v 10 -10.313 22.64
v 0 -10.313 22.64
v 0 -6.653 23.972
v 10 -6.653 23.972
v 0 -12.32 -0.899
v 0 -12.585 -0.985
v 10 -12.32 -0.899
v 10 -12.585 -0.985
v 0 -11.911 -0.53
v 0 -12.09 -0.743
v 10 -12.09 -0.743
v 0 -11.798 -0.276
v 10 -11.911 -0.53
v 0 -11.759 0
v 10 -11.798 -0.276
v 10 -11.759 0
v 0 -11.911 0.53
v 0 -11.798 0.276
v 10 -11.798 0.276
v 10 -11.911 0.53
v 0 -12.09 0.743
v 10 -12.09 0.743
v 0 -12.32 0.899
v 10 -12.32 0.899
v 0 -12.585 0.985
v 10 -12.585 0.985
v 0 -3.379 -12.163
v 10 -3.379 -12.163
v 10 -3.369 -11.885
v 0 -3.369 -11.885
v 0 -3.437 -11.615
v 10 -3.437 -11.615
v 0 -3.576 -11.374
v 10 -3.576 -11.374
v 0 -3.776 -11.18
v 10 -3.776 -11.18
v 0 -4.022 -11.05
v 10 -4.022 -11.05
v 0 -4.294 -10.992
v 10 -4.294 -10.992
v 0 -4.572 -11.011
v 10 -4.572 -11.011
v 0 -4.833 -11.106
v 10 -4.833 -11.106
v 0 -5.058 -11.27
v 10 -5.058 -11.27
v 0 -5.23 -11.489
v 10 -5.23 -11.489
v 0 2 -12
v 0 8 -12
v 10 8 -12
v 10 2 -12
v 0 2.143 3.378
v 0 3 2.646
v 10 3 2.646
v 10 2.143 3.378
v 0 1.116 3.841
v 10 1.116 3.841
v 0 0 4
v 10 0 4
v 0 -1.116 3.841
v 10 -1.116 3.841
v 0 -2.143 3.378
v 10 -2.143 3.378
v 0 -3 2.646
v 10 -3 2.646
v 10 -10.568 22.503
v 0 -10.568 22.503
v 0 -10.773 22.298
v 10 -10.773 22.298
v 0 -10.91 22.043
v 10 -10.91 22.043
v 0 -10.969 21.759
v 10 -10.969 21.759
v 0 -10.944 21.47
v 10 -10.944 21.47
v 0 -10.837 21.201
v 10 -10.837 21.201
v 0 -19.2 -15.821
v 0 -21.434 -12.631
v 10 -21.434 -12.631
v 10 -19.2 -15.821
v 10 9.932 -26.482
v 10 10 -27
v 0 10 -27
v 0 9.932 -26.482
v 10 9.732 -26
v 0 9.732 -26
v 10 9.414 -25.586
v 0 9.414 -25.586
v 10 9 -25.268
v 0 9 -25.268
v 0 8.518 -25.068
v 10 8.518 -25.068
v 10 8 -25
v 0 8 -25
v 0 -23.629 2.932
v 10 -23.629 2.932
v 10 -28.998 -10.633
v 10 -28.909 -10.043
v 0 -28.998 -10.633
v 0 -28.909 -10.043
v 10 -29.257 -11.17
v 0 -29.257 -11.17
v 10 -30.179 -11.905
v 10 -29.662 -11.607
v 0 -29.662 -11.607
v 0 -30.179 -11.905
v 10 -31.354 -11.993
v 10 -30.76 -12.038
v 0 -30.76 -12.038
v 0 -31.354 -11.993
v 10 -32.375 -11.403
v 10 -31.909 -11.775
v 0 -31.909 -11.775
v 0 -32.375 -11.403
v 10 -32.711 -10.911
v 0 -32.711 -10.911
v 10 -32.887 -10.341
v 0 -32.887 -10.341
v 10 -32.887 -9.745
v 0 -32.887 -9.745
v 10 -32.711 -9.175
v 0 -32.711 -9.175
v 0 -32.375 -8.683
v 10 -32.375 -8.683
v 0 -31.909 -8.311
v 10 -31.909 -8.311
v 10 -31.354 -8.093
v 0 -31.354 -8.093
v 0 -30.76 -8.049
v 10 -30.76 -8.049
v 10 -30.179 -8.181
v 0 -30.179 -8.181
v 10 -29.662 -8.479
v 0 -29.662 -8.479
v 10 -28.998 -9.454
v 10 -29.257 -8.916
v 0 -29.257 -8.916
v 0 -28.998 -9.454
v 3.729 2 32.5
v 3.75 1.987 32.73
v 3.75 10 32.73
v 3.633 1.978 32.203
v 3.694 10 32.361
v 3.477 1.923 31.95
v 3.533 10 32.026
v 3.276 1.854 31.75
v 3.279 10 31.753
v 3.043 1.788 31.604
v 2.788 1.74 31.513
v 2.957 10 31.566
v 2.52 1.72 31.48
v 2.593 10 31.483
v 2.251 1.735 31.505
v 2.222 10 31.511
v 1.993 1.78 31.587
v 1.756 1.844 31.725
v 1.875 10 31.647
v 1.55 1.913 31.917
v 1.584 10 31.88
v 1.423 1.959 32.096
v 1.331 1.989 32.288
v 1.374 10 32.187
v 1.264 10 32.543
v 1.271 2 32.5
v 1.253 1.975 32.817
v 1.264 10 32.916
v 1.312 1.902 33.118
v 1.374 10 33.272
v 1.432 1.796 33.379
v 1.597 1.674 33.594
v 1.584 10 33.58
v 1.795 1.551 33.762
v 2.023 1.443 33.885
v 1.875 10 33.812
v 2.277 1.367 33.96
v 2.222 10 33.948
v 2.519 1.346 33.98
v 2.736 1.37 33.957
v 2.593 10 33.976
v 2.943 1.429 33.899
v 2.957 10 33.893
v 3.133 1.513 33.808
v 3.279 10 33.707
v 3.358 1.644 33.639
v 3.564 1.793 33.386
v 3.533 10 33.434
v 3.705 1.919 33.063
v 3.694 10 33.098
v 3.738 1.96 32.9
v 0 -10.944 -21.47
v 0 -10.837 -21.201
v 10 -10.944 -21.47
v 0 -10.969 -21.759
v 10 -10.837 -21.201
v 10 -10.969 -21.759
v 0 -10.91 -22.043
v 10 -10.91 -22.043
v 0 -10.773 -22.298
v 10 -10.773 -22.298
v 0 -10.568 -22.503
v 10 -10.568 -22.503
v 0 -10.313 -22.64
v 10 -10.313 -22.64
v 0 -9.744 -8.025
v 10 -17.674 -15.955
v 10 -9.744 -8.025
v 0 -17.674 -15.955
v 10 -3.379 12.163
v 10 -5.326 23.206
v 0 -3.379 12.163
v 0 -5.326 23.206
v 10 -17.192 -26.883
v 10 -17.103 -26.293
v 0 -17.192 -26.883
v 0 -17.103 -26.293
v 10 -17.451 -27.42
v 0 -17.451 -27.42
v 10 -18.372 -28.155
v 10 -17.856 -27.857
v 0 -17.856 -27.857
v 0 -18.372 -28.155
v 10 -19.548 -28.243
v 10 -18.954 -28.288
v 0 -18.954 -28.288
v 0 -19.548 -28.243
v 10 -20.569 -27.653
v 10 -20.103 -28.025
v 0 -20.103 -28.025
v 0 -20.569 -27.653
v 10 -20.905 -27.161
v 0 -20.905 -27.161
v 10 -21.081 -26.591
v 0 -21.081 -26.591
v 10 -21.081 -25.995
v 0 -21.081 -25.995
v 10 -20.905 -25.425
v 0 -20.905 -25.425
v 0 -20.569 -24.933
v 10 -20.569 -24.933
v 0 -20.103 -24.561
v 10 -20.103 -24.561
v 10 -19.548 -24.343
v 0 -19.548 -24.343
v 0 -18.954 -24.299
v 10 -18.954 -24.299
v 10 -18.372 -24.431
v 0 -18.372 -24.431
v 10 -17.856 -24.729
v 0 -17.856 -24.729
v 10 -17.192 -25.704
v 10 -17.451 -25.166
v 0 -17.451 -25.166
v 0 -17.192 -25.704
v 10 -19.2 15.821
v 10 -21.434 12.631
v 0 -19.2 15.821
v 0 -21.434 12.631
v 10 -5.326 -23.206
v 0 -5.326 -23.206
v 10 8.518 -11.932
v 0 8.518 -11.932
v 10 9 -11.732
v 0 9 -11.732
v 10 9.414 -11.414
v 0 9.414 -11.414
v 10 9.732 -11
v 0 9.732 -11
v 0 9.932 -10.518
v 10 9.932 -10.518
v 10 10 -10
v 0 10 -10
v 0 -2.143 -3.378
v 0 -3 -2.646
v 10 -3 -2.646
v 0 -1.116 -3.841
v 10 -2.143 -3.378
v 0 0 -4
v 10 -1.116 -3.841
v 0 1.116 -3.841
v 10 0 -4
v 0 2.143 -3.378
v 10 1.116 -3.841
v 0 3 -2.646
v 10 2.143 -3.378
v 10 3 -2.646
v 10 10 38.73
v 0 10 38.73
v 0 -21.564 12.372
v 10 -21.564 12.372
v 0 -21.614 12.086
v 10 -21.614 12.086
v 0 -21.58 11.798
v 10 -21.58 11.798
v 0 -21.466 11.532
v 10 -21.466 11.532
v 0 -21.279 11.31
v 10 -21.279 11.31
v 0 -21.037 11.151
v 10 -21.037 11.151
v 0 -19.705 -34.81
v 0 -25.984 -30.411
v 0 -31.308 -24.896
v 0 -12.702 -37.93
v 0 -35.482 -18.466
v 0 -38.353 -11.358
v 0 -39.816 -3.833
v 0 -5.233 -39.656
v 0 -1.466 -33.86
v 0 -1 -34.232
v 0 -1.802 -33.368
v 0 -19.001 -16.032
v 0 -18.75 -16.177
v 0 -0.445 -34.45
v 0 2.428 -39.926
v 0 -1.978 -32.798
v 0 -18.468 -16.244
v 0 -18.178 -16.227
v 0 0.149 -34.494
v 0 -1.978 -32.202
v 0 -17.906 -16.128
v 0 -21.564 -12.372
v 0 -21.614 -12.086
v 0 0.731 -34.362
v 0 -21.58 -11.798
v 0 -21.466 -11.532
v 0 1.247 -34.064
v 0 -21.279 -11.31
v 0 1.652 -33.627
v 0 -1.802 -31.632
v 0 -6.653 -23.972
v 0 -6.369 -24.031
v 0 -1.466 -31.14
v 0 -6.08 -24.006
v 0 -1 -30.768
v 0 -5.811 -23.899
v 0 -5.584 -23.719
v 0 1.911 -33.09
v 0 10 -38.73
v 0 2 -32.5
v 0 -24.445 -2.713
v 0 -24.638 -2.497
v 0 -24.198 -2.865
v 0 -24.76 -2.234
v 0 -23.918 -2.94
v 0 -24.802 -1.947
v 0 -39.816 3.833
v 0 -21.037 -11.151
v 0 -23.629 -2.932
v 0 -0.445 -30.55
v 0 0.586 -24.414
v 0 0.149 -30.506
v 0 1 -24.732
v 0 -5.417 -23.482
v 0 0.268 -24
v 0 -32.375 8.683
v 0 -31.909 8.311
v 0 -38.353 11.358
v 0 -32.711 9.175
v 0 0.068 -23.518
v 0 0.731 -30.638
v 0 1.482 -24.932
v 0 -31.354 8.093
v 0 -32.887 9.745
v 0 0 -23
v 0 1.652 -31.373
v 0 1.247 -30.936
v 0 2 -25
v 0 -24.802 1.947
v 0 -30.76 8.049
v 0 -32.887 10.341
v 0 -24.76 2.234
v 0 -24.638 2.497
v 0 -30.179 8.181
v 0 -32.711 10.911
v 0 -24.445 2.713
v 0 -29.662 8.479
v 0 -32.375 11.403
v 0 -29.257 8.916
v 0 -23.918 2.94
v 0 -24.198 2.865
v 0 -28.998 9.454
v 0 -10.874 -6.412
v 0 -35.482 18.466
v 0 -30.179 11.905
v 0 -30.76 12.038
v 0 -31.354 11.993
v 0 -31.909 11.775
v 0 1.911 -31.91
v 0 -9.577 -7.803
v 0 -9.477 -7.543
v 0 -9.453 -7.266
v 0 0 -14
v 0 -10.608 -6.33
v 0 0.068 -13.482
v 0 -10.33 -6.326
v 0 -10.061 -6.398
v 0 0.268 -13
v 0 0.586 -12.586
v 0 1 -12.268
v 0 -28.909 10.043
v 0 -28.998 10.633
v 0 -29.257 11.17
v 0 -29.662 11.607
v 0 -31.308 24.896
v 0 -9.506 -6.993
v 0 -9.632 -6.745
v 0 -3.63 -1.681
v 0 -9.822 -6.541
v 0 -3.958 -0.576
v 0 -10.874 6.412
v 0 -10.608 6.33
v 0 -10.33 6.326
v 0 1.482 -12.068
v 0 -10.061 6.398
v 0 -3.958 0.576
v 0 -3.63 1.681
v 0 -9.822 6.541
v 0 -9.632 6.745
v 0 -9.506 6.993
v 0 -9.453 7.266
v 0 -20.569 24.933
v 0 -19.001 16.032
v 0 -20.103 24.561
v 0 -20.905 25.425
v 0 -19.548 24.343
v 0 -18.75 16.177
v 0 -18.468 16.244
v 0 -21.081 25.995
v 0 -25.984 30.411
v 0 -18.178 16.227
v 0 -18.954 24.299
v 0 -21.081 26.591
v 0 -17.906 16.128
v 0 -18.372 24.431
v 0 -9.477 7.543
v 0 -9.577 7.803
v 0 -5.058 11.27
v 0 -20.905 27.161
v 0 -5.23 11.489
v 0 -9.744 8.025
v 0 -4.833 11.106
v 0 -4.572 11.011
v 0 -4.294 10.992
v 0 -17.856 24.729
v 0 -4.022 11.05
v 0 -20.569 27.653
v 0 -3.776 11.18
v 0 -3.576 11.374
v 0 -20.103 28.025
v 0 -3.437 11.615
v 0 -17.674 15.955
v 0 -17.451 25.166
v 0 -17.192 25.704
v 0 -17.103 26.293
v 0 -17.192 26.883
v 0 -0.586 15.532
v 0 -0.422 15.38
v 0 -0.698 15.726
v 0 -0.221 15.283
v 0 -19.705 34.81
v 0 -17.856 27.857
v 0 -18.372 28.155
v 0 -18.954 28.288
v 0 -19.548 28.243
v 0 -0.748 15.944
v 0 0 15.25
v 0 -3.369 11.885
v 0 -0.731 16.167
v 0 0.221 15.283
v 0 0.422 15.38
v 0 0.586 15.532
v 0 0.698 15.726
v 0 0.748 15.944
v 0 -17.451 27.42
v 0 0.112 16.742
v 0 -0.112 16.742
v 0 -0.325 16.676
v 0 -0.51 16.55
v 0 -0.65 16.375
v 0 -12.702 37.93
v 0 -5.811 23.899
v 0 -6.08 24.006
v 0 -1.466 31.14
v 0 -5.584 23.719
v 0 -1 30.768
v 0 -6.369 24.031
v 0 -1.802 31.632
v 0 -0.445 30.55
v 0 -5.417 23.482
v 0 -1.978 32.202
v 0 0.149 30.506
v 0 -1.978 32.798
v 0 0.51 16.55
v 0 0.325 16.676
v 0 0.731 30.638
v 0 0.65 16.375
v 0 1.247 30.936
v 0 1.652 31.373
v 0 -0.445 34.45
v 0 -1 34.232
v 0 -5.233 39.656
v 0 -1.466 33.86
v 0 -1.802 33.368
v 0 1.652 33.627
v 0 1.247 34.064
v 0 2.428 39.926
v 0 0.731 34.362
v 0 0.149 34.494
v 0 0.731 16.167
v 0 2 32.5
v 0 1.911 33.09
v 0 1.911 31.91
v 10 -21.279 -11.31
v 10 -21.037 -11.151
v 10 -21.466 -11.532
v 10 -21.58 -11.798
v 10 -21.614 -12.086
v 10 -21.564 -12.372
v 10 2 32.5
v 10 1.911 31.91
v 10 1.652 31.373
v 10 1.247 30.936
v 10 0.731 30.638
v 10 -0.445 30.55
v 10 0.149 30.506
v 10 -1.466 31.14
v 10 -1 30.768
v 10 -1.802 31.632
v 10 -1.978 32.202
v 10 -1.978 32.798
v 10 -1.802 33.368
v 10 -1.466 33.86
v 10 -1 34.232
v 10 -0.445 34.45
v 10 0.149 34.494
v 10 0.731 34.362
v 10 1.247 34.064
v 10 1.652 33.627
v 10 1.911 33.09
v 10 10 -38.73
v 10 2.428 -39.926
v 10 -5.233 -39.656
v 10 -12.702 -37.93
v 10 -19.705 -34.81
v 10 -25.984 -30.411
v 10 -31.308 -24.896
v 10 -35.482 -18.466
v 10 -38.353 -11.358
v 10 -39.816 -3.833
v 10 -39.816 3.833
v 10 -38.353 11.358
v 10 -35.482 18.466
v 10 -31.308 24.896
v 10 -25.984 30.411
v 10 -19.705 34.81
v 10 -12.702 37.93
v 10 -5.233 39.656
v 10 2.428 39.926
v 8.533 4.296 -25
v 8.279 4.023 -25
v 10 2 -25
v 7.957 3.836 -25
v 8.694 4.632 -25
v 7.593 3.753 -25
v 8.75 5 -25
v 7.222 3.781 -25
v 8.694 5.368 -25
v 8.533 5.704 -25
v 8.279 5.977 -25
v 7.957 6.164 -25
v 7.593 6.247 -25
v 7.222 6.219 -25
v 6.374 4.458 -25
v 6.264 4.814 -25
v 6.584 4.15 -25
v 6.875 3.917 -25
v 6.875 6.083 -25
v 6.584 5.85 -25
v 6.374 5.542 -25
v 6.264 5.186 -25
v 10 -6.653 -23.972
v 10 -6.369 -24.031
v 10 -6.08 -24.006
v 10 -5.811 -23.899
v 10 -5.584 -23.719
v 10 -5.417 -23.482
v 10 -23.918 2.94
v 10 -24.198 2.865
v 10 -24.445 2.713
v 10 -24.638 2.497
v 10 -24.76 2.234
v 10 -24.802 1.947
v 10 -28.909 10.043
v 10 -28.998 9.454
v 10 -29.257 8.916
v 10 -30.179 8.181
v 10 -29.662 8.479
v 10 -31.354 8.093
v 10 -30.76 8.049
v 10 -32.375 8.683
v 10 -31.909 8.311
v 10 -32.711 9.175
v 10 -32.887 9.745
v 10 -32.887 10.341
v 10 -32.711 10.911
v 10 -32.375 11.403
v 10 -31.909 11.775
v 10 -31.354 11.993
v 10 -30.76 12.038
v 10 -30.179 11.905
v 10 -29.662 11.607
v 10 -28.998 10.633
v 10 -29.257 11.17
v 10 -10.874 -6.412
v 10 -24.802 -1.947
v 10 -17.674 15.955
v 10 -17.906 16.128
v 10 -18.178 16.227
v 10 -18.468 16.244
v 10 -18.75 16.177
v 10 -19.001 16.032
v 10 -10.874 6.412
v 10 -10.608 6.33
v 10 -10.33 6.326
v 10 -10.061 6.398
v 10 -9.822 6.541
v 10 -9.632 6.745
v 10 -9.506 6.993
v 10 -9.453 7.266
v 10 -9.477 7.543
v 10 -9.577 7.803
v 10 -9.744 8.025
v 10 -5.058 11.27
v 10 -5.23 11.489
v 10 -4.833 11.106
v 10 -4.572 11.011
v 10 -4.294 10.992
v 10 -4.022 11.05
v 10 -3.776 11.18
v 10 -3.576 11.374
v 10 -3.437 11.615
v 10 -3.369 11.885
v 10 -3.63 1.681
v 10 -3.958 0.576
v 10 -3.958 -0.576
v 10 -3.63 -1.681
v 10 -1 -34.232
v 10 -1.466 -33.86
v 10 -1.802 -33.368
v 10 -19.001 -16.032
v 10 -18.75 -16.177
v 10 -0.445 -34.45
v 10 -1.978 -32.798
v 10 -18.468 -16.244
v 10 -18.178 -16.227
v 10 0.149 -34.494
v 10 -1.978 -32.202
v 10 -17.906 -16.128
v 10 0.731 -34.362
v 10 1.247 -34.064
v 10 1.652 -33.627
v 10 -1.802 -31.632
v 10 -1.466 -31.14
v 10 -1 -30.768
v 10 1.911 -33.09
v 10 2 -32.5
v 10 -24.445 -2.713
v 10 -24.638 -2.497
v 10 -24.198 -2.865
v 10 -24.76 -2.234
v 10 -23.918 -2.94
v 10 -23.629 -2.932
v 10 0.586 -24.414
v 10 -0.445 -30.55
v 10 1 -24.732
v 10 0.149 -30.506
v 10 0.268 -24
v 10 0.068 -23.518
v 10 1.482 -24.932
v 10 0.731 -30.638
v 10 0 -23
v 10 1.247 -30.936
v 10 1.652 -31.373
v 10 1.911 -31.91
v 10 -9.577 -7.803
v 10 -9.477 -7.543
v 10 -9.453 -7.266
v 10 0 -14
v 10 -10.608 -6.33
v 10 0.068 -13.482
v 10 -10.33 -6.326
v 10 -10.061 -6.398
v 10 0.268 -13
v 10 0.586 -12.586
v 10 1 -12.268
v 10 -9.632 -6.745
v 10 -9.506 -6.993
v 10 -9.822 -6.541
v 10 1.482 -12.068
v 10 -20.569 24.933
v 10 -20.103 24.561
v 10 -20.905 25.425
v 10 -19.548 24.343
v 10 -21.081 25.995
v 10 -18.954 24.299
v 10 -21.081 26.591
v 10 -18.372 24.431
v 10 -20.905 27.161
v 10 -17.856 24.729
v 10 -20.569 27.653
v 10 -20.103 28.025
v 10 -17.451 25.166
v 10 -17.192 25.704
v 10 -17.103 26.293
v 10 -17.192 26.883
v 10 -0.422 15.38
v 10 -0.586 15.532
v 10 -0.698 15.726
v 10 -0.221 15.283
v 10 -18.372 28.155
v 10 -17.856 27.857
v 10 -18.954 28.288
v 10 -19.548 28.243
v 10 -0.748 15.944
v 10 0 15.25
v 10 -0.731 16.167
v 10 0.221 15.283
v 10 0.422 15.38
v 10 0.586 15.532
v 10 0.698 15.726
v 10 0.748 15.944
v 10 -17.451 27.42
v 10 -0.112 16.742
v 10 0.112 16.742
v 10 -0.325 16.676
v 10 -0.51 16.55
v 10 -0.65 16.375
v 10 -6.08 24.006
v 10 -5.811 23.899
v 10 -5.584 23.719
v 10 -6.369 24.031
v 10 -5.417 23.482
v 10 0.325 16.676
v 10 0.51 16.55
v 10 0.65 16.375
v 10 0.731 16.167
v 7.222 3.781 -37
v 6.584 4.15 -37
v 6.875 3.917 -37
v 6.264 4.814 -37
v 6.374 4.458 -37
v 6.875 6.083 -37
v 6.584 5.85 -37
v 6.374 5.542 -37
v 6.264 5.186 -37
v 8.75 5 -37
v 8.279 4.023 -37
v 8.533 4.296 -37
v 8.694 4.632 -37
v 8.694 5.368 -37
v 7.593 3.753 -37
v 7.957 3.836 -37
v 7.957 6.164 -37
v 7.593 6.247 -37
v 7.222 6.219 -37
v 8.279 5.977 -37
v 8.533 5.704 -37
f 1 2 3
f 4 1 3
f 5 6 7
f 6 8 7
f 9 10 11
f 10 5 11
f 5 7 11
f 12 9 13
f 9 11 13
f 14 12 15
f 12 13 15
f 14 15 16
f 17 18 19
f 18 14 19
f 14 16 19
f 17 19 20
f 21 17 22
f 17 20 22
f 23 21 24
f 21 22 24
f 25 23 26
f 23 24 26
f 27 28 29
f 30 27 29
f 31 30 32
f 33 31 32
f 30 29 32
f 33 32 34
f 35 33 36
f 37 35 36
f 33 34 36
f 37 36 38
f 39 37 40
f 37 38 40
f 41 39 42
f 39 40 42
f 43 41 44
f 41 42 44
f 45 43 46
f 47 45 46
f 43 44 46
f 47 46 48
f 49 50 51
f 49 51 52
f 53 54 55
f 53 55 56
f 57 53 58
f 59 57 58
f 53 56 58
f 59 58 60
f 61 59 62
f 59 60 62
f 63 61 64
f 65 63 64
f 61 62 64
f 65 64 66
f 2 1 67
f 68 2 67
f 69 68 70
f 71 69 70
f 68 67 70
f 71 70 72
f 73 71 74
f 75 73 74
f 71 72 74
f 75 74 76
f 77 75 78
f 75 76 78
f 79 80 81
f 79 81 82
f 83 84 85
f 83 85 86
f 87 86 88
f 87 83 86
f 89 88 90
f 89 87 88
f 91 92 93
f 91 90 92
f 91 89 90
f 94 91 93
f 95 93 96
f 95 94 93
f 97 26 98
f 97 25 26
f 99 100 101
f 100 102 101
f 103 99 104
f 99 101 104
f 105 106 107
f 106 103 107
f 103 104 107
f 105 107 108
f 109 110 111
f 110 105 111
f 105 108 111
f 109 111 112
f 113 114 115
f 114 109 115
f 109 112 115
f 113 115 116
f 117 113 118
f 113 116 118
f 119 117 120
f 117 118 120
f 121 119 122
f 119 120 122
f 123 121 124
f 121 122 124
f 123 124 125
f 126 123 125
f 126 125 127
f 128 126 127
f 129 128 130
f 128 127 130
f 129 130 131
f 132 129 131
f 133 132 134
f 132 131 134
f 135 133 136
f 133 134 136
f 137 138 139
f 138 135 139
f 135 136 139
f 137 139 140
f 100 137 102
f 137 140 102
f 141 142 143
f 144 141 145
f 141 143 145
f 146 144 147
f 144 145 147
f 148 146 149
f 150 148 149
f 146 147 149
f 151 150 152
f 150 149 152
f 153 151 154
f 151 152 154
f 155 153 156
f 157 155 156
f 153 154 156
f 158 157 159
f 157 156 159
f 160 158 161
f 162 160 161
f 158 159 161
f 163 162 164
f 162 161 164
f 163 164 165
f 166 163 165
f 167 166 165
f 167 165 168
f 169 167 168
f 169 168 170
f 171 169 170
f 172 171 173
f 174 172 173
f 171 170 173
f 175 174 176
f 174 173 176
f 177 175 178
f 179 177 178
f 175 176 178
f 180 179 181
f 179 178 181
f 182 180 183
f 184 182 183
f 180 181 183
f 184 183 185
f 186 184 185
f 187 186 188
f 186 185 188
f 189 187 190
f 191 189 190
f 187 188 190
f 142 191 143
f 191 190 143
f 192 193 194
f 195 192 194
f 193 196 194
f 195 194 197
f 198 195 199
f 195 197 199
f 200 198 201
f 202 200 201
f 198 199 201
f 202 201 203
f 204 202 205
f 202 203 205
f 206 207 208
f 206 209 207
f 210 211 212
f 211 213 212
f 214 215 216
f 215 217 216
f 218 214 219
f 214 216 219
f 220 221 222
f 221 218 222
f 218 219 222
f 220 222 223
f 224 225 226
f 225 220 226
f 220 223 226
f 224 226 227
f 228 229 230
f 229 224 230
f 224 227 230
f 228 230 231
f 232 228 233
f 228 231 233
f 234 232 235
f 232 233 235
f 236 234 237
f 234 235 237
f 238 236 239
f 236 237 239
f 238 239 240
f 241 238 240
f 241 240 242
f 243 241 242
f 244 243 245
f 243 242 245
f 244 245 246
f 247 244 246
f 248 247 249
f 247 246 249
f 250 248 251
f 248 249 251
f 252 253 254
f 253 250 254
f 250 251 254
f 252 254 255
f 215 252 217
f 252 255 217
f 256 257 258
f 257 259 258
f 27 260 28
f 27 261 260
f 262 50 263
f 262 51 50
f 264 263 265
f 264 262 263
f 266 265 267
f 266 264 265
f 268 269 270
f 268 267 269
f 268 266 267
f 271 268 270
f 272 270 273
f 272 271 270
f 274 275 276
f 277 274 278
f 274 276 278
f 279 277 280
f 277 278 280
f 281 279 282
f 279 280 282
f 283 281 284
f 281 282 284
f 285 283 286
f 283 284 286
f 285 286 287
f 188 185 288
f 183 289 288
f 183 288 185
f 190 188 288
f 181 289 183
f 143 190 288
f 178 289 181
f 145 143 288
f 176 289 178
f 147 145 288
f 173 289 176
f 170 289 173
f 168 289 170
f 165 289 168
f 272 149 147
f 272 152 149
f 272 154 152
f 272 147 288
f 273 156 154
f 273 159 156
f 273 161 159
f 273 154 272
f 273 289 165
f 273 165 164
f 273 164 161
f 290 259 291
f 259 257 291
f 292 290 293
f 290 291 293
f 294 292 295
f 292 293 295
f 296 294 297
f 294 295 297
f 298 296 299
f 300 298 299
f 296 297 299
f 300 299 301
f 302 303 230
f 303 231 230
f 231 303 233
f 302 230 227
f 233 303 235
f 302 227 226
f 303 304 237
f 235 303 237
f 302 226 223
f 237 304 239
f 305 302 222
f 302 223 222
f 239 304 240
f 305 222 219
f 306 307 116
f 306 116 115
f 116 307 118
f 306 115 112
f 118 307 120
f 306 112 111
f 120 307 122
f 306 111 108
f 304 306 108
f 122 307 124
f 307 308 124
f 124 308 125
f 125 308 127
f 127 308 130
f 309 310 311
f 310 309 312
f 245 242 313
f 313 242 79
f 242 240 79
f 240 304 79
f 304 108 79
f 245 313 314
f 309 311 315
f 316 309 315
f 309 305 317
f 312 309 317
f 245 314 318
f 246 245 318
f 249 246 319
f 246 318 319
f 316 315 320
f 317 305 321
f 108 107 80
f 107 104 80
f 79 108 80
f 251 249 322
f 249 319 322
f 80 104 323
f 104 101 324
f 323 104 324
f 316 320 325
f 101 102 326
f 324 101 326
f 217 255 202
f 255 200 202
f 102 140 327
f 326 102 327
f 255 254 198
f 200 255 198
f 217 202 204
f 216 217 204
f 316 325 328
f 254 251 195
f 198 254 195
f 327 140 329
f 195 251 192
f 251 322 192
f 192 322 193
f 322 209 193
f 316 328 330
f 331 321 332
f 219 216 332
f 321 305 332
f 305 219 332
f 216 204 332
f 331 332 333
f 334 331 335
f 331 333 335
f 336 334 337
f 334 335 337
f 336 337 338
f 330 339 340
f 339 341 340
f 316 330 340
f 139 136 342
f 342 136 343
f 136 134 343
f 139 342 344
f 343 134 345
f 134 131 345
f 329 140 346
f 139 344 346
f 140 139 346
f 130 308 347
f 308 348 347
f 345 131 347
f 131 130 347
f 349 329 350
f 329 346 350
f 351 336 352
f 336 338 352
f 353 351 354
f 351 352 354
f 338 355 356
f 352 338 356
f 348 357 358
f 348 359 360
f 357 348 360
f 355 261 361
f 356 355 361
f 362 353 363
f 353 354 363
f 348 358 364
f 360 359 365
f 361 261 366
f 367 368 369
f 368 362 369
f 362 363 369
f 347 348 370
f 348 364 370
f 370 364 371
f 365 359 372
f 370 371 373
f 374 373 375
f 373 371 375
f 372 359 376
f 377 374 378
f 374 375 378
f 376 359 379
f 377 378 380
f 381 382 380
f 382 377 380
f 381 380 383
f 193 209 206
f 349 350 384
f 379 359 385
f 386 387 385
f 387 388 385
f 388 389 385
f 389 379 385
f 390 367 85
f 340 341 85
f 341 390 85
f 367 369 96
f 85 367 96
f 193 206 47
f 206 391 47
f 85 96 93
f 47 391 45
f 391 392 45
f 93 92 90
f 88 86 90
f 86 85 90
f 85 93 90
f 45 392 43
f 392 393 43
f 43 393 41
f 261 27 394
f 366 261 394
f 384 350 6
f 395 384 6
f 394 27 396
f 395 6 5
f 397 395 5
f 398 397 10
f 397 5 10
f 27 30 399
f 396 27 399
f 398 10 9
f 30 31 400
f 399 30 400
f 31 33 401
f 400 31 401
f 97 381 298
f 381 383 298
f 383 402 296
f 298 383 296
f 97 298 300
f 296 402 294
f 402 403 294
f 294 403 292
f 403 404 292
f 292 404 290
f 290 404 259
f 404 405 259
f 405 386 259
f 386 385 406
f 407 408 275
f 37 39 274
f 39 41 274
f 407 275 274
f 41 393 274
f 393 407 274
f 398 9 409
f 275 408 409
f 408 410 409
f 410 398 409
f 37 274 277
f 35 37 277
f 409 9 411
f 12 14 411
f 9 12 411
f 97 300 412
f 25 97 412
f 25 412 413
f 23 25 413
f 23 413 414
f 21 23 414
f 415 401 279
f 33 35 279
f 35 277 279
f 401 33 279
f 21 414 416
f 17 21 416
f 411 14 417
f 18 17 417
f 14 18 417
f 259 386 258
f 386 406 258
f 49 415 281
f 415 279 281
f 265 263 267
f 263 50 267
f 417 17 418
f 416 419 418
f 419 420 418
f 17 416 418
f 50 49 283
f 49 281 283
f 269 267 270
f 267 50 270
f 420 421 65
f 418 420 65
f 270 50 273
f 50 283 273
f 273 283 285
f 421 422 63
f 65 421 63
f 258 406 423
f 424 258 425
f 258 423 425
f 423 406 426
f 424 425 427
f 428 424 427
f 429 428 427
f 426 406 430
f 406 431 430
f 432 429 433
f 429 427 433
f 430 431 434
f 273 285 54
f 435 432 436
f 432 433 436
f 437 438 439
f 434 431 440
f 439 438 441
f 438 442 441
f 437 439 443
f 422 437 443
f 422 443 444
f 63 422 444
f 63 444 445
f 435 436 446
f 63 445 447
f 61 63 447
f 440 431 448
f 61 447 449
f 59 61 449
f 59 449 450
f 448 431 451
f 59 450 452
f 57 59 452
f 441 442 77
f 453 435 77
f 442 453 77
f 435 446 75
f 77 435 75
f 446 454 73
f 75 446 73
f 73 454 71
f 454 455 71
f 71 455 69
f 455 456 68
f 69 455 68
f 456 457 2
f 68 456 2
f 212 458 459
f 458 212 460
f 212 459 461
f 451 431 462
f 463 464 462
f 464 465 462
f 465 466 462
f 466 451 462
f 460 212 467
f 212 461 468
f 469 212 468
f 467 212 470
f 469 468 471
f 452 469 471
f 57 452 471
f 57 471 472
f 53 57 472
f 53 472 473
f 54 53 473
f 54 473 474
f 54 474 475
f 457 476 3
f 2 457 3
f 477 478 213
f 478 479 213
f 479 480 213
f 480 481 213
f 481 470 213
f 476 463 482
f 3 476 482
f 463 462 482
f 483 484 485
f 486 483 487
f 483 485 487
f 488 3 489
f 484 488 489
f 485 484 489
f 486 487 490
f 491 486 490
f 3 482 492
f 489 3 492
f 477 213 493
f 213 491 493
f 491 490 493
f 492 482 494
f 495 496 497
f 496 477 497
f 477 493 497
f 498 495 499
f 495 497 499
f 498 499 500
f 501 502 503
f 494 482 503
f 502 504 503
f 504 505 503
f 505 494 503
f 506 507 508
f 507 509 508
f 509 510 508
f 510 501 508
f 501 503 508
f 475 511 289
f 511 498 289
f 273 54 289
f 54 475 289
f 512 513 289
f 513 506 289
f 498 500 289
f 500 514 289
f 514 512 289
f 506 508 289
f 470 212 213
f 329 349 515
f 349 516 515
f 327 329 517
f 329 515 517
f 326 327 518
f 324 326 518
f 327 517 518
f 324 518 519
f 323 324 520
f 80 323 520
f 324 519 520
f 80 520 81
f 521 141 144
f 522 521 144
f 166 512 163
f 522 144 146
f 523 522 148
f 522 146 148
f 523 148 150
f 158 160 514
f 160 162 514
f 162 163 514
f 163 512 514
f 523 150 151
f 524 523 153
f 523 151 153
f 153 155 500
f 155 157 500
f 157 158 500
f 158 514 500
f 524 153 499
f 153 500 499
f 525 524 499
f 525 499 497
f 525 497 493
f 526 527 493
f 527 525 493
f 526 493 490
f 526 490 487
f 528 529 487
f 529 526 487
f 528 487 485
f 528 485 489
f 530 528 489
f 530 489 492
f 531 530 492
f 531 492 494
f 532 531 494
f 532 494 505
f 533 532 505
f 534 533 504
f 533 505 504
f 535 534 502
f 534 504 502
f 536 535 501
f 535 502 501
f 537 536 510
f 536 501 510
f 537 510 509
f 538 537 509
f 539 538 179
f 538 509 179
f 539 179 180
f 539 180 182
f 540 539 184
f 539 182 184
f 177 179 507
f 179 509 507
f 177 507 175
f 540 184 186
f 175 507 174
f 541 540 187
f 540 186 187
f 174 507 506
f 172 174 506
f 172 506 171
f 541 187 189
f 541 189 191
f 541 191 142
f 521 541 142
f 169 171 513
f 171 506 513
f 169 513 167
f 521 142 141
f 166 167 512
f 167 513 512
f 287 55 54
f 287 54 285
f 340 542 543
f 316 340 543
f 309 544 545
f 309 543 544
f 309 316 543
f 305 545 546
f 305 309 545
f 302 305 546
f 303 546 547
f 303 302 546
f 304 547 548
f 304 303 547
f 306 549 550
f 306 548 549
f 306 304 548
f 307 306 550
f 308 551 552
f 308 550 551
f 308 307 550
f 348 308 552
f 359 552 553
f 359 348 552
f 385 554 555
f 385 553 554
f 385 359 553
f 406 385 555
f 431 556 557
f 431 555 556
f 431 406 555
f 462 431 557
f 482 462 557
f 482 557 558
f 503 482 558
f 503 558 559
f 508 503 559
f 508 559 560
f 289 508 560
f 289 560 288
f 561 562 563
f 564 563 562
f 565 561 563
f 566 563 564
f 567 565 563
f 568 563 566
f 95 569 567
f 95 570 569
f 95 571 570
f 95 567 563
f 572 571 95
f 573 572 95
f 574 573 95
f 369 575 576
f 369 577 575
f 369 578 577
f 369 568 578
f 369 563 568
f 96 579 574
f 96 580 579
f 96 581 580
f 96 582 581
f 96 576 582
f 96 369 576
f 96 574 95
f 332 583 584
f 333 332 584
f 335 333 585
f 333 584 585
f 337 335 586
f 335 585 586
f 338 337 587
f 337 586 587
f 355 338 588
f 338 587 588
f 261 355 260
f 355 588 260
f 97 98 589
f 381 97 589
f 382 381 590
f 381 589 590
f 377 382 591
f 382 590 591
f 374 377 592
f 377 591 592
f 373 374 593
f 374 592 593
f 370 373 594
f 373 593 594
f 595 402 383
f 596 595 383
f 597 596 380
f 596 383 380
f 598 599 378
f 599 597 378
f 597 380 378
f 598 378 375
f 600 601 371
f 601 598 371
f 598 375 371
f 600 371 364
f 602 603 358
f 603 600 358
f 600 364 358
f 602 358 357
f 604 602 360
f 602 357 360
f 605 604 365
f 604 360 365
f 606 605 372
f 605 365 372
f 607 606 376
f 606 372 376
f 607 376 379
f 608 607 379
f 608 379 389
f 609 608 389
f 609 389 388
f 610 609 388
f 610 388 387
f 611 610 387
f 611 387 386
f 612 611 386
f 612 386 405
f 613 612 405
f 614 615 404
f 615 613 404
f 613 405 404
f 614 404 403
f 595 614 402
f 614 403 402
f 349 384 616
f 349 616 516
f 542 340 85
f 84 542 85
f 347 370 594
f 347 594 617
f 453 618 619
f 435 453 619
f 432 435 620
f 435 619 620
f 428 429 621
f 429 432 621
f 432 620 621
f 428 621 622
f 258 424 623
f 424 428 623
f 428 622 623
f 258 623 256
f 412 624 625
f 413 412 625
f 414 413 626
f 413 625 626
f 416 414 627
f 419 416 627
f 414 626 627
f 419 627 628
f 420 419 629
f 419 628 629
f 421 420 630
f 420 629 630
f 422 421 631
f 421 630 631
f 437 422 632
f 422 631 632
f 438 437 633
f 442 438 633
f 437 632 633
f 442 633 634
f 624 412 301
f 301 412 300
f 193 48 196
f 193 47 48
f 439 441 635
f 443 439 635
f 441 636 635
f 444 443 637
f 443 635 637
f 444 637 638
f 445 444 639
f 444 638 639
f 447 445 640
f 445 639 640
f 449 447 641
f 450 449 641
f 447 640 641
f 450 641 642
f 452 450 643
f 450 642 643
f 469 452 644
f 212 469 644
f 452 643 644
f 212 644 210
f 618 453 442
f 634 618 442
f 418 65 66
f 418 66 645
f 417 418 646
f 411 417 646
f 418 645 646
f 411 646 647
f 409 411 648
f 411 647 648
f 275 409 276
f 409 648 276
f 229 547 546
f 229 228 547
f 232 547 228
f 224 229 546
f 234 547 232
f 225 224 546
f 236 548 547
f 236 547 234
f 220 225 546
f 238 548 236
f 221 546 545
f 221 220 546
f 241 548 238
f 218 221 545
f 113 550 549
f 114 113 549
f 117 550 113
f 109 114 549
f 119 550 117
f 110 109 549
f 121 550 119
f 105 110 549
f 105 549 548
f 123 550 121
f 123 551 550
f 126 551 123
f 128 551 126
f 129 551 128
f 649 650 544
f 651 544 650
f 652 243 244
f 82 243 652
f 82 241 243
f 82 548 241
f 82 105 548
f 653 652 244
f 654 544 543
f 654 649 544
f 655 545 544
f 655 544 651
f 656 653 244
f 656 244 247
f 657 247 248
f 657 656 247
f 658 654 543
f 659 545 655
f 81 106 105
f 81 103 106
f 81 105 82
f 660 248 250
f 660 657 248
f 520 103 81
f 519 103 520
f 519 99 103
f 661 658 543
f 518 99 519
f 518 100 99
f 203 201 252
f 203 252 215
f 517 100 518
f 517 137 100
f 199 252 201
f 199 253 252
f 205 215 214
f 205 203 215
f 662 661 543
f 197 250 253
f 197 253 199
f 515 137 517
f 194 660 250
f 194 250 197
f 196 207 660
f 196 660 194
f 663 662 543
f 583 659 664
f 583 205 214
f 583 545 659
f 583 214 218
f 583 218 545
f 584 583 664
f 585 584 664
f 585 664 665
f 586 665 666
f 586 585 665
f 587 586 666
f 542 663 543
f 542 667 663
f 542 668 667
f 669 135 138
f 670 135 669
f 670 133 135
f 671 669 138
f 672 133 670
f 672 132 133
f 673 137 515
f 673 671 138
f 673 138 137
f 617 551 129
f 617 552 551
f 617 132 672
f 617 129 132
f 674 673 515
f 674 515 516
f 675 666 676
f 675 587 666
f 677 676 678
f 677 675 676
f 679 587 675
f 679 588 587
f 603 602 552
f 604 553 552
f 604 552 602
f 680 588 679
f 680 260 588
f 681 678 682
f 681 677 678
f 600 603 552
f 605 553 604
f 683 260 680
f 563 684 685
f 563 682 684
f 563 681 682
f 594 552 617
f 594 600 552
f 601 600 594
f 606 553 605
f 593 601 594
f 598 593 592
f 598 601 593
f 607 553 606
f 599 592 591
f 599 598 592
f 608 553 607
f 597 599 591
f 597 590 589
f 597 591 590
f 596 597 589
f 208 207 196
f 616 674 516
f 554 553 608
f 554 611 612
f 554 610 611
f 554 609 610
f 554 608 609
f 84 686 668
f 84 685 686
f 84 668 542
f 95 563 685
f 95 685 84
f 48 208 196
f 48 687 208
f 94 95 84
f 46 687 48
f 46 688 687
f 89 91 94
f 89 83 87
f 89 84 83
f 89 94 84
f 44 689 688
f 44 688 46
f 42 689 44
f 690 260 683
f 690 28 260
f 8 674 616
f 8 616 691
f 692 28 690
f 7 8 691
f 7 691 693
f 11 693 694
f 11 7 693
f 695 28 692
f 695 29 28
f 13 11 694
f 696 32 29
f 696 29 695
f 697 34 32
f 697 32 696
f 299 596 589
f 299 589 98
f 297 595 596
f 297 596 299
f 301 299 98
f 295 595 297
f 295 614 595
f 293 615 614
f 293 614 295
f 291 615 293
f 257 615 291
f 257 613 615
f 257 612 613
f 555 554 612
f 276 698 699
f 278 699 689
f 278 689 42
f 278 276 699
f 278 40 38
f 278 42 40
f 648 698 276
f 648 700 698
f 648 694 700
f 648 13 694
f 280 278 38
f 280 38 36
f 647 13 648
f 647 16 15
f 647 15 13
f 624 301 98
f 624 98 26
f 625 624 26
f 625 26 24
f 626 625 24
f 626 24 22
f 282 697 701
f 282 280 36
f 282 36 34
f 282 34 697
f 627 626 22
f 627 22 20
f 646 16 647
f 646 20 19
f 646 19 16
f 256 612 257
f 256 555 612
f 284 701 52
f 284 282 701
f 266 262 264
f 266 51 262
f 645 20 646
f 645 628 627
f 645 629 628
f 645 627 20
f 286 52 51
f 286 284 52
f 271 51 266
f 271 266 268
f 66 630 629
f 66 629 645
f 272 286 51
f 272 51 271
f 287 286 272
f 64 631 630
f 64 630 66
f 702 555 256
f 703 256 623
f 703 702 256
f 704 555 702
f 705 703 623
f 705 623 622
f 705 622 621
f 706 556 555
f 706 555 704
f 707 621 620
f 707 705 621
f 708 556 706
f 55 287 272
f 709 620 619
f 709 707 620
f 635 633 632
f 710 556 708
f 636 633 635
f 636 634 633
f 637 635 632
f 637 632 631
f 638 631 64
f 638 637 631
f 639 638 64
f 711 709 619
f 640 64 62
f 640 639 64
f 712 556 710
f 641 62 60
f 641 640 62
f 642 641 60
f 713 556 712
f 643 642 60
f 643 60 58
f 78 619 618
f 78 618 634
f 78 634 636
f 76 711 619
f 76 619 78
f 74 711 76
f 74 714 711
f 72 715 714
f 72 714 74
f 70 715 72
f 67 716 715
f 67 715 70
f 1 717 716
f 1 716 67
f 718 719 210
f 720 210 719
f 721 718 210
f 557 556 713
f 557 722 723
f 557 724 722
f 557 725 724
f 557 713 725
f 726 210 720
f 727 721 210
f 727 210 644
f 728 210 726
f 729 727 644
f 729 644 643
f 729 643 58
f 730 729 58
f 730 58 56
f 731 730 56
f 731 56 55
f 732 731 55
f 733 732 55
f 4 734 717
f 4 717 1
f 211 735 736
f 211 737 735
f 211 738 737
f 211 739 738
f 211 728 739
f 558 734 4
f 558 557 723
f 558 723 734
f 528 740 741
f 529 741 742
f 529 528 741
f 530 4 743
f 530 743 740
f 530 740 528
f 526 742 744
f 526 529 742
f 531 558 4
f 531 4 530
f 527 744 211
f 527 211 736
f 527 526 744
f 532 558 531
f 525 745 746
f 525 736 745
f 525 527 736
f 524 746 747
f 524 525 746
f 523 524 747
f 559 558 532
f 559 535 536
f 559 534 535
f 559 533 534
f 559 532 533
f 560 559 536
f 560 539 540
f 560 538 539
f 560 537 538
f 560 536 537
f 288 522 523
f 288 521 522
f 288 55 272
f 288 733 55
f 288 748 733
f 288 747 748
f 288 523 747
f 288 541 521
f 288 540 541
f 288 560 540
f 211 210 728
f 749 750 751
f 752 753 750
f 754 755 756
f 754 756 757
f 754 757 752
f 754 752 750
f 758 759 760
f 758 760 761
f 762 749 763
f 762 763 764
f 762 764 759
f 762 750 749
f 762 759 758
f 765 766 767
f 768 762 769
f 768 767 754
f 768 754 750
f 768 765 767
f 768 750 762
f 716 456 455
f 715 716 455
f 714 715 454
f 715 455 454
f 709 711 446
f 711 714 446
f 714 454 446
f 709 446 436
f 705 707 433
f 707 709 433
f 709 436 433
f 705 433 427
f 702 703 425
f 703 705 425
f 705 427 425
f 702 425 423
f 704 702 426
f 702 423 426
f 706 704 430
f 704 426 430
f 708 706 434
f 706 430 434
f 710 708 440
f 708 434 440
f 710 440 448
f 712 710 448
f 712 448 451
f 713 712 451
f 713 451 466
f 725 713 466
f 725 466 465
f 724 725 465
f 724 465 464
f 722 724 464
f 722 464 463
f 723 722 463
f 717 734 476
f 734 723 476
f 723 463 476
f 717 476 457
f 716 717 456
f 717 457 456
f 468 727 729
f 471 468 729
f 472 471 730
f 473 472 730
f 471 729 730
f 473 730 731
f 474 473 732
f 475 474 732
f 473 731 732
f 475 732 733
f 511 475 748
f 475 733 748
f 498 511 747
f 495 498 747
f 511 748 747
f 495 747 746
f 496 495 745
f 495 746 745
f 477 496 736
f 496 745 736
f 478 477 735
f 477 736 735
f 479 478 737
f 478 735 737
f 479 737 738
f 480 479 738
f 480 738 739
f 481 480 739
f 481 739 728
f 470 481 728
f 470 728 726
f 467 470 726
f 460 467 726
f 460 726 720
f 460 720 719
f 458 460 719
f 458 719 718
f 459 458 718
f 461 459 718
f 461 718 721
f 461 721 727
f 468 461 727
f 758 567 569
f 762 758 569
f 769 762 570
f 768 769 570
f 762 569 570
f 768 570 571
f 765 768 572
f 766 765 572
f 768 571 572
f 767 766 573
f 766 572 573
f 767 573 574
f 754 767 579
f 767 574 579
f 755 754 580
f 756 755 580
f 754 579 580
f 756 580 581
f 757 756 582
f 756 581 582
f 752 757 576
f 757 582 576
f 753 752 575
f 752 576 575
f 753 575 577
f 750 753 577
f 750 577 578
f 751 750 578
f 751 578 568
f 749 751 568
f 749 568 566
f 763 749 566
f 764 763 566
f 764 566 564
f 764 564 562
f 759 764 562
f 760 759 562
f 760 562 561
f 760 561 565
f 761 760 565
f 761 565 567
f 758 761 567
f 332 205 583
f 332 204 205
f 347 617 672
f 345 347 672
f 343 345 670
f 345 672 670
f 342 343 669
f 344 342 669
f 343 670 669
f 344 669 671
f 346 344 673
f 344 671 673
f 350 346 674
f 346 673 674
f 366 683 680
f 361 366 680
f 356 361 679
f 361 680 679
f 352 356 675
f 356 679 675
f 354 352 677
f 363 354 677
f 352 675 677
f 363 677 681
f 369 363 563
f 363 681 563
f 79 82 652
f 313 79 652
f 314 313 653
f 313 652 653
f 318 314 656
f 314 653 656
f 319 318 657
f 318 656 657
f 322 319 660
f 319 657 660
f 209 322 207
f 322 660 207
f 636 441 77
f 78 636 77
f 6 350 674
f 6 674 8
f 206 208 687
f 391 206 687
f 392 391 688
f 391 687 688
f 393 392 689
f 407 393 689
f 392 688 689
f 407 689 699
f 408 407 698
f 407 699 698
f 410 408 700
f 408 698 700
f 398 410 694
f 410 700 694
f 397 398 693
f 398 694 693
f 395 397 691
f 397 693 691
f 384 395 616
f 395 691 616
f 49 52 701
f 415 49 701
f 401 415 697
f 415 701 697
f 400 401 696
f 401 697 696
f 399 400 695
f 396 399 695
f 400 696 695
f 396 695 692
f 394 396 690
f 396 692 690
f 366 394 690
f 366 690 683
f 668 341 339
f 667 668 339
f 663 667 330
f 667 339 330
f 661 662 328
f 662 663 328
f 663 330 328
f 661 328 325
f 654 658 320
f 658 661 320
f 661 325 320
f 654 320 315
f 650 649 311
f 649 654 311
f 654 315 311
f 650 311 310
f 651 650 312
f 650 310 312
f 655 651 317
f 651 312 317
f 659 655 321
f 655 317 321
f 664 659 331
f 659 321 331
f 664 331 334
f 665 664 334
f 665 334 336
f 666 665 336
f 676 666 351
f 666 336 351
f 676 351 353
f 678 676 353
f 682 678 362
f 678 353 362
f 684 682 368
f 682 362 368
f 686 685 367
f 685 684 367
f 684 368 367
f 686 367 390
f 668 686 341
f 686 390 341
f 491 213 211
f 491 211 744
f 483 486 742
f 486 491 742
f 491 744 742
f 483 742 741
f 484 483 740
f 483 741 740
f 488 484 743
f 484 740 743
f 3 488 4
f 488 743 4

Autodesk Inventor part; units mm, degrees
ref_plane "YZ Plane" through (0, 0, 0) normal (1, 0, 0) x (0, 1, 0)
ref_plane "XZ Plane" through (0, 0, 0) normal (0, 1, 0) x (-1, 0, 0)
ref_plane "XY Plane" through (0, 0, 0) normal (0, 0, 1) x (1, 0, 0)
sketch "Skizze1" plane through (0, 0, 0) normal (1, 0, 0) x (0, 1, 0)
  arc A0 (10, 38.7298) -> (10, -38.7298) centre (0, 0) ccw
  line L0 (10, 38.7298) -> (10, -12)
  line L1 (10, -38.7298) -> (10, -25)
  line L2 (10, -12) -> (0, -12)
  line L3 (0, -12) -> (0, -25)
  line L4 (0, -25) -> (10, -25)
  circle A1 centre (0, 32.5) radius 2
  circle A2 centre (-19.103, 26.2931) radius 2
  circle A3 centre (-30.9093, 10.0431) radius 2
  circle A4 centre (-30.9093, -10.0431) radius 2
  circle A5 centre (-19.103, -26.2931) radius 2
  circle A6 centre (0, -32.5) radius 2
  circle A7 centre (0, 0) radius 1.25
  line L5 (-7, 0) -> (-24.8022, 3.139)
  line L6 (-24.8022, 3.139) -> (-24.8022, -3.139)
  line L7 (-24.8022, -3.139) -> (-7, 0)
  line L8 (-54.5, 0) -> (47, 0) construction
  line L9 (-18.5163, -16.7972) -> (-5.7341, -4.015)
  line L10 (-5.7341, -4.015) -> (-22.1172, -11.6546)
  line L11 (-22.1172, -11.6546) -> (-18.5163, -16.7972)
  line L12 (-5.5331, -24.38) -> (-2.3941, -6.5778)
  line L13 (-2.3941, -6.5778) -> (-11.4325, -22.2328)
  line L14 (-11.4325, -22.2328) -> (-5.5331, -24.38)
  line L15 (-18.5163, 16.7972) -> (-5.7341, 4.015)
  line L16 (-5.7341, 4.015) -> (-22.1172, 11.6546)
  line L17 (-22.1172, 11.6546) -> (-18.5163, 16.7972)
  line L18 (-5.5331, 24.38) -> (-2.3941, 6.5778)
  line L19 (-2.3941, 6.5778) -> (-11.4325, 22.2328)
  line L20 (-11.4325, 22.2328) -> (-5.5331, 24.38)
  circle A8 centre (0, 0) radius 25 construction
  circle A9 centre (0, 0) radius 32.5 construction
  point P0 (-24.8022, 0)
  dimension "d50" = 65
  dimension "d0" = 80
  dimension "d3" = 10
  dimension "d4" = 10
  dimension "d5" = 10
  dimension "d7" = 0
  dimension "d8" = 4
  dimension "d11" = 180
  dimension "d13" = 2.5
  dimension "d19" = 20
  dimension "d22" = 0
  dimension "d23" = 7
  dimension "d26" = 70
  dimension "d49" = 50
  dimension "d51" = 12
extrude "Extrusion1" add sketch "Skizze1" along normal blind 10
fillet "Rundung1" radius 1 15 edges at (5, -5.5331, -24.38) (5, -11.4325, -22.2328) (5, -18.5163, -16.7972) (5, -22.1172, -11.6546) (5, -24.8022, -3.139) (5, -24.8022, 3.139) (5, -18.5163, 16.7972) (5, -22.1172, 11.6546) (5, -11.4325, 22.2328) (5, -5.5331, 24.38) (5, -2.3941, 6.5778) (5, -5.7341, 4.015) (5, -7, 0) (5, -5.7341, -4.015) (5, -2.3941, -6.5778)
fillet "Rundung2" radius 2 4 edges at (5, 10, -12) (5, 0, -12) (5, 0, -25) (5, 10, -25)
sketch "Skizze2" plane through (10, 0, 0) normal (1, 0, 0) x (0, 0, -1)
  circle A0 centre (-16, 0) radius 0.75
  point P0 (0, 0)
  dimension "d30" = 1.5
  dimension "d31" = 16
extrude "Extrusion2" cut sketch "Skizze2" against normal blind 10
sketch "Skizze3" plane through (0, 2, -25) normal (0, 0, 1) x (1, 0, 0)
  circle A0 centre (7.5, 3) radius 1.25
  line L0 (10, 6) -> (10, 0) projected
  line L1 (0, 6) -> (10, 6) projected
  point P0 (0, -2)
  point P1 (10, 0.8802)
  dimension "d35" = 2.5
  dimension "d36" = 2.5
  dimension "d37" = 3
extrude "Extrusion3" cut sketch "Skizze3" against normal blind 12
sketch "Skizze4" plane through (0, 10, 38.7298) normal (0, 1, 0) x (1, 0, 0)
  circle A0 centre (2.5, 6) radius 1.25
  line L0 (0, 48.7298) -> (0, 0) projected
  line L1 (0, 0) -> (10, 0) projected
  point P0 (0, 38.7298)
  dimension "d40" = 2.5
  dimension "d41" = 2.5
  dimension "d42" = 6
extrude "Extrusion4" cut sketch "Skizze4" against normal blind 10
sketch "Skizze5" plane through (10, 0, 0) normal (1, 0, 0) x (0, 0, -1)
  circle A0 centre (0, 0) radius 1.25 projected
  arc A1 (2.6458, -3) -> (-2.6458, -3) centre (0, 0) ccw
  line L0 (-2.6458, -3) -> (2.6458, -3)
  circle A2 centre (0, 0) radius 4
  line L1 (-2.6458, 3) -> (2.6458, 3)
  line L2 (0, 0) -> (0, 3) construction
  point P0 (-2.6458, -3)
  dimension "CapstonV2_ShaftDia" = 8
  dimension "Poligonprofil_Ausnehmung" = 1
  dimension "d52" = 1
extrude "Extrusion5" cut sketch "Skizze5" against normal blind 10 contours L0 A1 L1 | A2 L0
equation "\"d50\" = 0.5 * d0 + 0.5 * d49"
properties part number "Capstondisc_v2"
